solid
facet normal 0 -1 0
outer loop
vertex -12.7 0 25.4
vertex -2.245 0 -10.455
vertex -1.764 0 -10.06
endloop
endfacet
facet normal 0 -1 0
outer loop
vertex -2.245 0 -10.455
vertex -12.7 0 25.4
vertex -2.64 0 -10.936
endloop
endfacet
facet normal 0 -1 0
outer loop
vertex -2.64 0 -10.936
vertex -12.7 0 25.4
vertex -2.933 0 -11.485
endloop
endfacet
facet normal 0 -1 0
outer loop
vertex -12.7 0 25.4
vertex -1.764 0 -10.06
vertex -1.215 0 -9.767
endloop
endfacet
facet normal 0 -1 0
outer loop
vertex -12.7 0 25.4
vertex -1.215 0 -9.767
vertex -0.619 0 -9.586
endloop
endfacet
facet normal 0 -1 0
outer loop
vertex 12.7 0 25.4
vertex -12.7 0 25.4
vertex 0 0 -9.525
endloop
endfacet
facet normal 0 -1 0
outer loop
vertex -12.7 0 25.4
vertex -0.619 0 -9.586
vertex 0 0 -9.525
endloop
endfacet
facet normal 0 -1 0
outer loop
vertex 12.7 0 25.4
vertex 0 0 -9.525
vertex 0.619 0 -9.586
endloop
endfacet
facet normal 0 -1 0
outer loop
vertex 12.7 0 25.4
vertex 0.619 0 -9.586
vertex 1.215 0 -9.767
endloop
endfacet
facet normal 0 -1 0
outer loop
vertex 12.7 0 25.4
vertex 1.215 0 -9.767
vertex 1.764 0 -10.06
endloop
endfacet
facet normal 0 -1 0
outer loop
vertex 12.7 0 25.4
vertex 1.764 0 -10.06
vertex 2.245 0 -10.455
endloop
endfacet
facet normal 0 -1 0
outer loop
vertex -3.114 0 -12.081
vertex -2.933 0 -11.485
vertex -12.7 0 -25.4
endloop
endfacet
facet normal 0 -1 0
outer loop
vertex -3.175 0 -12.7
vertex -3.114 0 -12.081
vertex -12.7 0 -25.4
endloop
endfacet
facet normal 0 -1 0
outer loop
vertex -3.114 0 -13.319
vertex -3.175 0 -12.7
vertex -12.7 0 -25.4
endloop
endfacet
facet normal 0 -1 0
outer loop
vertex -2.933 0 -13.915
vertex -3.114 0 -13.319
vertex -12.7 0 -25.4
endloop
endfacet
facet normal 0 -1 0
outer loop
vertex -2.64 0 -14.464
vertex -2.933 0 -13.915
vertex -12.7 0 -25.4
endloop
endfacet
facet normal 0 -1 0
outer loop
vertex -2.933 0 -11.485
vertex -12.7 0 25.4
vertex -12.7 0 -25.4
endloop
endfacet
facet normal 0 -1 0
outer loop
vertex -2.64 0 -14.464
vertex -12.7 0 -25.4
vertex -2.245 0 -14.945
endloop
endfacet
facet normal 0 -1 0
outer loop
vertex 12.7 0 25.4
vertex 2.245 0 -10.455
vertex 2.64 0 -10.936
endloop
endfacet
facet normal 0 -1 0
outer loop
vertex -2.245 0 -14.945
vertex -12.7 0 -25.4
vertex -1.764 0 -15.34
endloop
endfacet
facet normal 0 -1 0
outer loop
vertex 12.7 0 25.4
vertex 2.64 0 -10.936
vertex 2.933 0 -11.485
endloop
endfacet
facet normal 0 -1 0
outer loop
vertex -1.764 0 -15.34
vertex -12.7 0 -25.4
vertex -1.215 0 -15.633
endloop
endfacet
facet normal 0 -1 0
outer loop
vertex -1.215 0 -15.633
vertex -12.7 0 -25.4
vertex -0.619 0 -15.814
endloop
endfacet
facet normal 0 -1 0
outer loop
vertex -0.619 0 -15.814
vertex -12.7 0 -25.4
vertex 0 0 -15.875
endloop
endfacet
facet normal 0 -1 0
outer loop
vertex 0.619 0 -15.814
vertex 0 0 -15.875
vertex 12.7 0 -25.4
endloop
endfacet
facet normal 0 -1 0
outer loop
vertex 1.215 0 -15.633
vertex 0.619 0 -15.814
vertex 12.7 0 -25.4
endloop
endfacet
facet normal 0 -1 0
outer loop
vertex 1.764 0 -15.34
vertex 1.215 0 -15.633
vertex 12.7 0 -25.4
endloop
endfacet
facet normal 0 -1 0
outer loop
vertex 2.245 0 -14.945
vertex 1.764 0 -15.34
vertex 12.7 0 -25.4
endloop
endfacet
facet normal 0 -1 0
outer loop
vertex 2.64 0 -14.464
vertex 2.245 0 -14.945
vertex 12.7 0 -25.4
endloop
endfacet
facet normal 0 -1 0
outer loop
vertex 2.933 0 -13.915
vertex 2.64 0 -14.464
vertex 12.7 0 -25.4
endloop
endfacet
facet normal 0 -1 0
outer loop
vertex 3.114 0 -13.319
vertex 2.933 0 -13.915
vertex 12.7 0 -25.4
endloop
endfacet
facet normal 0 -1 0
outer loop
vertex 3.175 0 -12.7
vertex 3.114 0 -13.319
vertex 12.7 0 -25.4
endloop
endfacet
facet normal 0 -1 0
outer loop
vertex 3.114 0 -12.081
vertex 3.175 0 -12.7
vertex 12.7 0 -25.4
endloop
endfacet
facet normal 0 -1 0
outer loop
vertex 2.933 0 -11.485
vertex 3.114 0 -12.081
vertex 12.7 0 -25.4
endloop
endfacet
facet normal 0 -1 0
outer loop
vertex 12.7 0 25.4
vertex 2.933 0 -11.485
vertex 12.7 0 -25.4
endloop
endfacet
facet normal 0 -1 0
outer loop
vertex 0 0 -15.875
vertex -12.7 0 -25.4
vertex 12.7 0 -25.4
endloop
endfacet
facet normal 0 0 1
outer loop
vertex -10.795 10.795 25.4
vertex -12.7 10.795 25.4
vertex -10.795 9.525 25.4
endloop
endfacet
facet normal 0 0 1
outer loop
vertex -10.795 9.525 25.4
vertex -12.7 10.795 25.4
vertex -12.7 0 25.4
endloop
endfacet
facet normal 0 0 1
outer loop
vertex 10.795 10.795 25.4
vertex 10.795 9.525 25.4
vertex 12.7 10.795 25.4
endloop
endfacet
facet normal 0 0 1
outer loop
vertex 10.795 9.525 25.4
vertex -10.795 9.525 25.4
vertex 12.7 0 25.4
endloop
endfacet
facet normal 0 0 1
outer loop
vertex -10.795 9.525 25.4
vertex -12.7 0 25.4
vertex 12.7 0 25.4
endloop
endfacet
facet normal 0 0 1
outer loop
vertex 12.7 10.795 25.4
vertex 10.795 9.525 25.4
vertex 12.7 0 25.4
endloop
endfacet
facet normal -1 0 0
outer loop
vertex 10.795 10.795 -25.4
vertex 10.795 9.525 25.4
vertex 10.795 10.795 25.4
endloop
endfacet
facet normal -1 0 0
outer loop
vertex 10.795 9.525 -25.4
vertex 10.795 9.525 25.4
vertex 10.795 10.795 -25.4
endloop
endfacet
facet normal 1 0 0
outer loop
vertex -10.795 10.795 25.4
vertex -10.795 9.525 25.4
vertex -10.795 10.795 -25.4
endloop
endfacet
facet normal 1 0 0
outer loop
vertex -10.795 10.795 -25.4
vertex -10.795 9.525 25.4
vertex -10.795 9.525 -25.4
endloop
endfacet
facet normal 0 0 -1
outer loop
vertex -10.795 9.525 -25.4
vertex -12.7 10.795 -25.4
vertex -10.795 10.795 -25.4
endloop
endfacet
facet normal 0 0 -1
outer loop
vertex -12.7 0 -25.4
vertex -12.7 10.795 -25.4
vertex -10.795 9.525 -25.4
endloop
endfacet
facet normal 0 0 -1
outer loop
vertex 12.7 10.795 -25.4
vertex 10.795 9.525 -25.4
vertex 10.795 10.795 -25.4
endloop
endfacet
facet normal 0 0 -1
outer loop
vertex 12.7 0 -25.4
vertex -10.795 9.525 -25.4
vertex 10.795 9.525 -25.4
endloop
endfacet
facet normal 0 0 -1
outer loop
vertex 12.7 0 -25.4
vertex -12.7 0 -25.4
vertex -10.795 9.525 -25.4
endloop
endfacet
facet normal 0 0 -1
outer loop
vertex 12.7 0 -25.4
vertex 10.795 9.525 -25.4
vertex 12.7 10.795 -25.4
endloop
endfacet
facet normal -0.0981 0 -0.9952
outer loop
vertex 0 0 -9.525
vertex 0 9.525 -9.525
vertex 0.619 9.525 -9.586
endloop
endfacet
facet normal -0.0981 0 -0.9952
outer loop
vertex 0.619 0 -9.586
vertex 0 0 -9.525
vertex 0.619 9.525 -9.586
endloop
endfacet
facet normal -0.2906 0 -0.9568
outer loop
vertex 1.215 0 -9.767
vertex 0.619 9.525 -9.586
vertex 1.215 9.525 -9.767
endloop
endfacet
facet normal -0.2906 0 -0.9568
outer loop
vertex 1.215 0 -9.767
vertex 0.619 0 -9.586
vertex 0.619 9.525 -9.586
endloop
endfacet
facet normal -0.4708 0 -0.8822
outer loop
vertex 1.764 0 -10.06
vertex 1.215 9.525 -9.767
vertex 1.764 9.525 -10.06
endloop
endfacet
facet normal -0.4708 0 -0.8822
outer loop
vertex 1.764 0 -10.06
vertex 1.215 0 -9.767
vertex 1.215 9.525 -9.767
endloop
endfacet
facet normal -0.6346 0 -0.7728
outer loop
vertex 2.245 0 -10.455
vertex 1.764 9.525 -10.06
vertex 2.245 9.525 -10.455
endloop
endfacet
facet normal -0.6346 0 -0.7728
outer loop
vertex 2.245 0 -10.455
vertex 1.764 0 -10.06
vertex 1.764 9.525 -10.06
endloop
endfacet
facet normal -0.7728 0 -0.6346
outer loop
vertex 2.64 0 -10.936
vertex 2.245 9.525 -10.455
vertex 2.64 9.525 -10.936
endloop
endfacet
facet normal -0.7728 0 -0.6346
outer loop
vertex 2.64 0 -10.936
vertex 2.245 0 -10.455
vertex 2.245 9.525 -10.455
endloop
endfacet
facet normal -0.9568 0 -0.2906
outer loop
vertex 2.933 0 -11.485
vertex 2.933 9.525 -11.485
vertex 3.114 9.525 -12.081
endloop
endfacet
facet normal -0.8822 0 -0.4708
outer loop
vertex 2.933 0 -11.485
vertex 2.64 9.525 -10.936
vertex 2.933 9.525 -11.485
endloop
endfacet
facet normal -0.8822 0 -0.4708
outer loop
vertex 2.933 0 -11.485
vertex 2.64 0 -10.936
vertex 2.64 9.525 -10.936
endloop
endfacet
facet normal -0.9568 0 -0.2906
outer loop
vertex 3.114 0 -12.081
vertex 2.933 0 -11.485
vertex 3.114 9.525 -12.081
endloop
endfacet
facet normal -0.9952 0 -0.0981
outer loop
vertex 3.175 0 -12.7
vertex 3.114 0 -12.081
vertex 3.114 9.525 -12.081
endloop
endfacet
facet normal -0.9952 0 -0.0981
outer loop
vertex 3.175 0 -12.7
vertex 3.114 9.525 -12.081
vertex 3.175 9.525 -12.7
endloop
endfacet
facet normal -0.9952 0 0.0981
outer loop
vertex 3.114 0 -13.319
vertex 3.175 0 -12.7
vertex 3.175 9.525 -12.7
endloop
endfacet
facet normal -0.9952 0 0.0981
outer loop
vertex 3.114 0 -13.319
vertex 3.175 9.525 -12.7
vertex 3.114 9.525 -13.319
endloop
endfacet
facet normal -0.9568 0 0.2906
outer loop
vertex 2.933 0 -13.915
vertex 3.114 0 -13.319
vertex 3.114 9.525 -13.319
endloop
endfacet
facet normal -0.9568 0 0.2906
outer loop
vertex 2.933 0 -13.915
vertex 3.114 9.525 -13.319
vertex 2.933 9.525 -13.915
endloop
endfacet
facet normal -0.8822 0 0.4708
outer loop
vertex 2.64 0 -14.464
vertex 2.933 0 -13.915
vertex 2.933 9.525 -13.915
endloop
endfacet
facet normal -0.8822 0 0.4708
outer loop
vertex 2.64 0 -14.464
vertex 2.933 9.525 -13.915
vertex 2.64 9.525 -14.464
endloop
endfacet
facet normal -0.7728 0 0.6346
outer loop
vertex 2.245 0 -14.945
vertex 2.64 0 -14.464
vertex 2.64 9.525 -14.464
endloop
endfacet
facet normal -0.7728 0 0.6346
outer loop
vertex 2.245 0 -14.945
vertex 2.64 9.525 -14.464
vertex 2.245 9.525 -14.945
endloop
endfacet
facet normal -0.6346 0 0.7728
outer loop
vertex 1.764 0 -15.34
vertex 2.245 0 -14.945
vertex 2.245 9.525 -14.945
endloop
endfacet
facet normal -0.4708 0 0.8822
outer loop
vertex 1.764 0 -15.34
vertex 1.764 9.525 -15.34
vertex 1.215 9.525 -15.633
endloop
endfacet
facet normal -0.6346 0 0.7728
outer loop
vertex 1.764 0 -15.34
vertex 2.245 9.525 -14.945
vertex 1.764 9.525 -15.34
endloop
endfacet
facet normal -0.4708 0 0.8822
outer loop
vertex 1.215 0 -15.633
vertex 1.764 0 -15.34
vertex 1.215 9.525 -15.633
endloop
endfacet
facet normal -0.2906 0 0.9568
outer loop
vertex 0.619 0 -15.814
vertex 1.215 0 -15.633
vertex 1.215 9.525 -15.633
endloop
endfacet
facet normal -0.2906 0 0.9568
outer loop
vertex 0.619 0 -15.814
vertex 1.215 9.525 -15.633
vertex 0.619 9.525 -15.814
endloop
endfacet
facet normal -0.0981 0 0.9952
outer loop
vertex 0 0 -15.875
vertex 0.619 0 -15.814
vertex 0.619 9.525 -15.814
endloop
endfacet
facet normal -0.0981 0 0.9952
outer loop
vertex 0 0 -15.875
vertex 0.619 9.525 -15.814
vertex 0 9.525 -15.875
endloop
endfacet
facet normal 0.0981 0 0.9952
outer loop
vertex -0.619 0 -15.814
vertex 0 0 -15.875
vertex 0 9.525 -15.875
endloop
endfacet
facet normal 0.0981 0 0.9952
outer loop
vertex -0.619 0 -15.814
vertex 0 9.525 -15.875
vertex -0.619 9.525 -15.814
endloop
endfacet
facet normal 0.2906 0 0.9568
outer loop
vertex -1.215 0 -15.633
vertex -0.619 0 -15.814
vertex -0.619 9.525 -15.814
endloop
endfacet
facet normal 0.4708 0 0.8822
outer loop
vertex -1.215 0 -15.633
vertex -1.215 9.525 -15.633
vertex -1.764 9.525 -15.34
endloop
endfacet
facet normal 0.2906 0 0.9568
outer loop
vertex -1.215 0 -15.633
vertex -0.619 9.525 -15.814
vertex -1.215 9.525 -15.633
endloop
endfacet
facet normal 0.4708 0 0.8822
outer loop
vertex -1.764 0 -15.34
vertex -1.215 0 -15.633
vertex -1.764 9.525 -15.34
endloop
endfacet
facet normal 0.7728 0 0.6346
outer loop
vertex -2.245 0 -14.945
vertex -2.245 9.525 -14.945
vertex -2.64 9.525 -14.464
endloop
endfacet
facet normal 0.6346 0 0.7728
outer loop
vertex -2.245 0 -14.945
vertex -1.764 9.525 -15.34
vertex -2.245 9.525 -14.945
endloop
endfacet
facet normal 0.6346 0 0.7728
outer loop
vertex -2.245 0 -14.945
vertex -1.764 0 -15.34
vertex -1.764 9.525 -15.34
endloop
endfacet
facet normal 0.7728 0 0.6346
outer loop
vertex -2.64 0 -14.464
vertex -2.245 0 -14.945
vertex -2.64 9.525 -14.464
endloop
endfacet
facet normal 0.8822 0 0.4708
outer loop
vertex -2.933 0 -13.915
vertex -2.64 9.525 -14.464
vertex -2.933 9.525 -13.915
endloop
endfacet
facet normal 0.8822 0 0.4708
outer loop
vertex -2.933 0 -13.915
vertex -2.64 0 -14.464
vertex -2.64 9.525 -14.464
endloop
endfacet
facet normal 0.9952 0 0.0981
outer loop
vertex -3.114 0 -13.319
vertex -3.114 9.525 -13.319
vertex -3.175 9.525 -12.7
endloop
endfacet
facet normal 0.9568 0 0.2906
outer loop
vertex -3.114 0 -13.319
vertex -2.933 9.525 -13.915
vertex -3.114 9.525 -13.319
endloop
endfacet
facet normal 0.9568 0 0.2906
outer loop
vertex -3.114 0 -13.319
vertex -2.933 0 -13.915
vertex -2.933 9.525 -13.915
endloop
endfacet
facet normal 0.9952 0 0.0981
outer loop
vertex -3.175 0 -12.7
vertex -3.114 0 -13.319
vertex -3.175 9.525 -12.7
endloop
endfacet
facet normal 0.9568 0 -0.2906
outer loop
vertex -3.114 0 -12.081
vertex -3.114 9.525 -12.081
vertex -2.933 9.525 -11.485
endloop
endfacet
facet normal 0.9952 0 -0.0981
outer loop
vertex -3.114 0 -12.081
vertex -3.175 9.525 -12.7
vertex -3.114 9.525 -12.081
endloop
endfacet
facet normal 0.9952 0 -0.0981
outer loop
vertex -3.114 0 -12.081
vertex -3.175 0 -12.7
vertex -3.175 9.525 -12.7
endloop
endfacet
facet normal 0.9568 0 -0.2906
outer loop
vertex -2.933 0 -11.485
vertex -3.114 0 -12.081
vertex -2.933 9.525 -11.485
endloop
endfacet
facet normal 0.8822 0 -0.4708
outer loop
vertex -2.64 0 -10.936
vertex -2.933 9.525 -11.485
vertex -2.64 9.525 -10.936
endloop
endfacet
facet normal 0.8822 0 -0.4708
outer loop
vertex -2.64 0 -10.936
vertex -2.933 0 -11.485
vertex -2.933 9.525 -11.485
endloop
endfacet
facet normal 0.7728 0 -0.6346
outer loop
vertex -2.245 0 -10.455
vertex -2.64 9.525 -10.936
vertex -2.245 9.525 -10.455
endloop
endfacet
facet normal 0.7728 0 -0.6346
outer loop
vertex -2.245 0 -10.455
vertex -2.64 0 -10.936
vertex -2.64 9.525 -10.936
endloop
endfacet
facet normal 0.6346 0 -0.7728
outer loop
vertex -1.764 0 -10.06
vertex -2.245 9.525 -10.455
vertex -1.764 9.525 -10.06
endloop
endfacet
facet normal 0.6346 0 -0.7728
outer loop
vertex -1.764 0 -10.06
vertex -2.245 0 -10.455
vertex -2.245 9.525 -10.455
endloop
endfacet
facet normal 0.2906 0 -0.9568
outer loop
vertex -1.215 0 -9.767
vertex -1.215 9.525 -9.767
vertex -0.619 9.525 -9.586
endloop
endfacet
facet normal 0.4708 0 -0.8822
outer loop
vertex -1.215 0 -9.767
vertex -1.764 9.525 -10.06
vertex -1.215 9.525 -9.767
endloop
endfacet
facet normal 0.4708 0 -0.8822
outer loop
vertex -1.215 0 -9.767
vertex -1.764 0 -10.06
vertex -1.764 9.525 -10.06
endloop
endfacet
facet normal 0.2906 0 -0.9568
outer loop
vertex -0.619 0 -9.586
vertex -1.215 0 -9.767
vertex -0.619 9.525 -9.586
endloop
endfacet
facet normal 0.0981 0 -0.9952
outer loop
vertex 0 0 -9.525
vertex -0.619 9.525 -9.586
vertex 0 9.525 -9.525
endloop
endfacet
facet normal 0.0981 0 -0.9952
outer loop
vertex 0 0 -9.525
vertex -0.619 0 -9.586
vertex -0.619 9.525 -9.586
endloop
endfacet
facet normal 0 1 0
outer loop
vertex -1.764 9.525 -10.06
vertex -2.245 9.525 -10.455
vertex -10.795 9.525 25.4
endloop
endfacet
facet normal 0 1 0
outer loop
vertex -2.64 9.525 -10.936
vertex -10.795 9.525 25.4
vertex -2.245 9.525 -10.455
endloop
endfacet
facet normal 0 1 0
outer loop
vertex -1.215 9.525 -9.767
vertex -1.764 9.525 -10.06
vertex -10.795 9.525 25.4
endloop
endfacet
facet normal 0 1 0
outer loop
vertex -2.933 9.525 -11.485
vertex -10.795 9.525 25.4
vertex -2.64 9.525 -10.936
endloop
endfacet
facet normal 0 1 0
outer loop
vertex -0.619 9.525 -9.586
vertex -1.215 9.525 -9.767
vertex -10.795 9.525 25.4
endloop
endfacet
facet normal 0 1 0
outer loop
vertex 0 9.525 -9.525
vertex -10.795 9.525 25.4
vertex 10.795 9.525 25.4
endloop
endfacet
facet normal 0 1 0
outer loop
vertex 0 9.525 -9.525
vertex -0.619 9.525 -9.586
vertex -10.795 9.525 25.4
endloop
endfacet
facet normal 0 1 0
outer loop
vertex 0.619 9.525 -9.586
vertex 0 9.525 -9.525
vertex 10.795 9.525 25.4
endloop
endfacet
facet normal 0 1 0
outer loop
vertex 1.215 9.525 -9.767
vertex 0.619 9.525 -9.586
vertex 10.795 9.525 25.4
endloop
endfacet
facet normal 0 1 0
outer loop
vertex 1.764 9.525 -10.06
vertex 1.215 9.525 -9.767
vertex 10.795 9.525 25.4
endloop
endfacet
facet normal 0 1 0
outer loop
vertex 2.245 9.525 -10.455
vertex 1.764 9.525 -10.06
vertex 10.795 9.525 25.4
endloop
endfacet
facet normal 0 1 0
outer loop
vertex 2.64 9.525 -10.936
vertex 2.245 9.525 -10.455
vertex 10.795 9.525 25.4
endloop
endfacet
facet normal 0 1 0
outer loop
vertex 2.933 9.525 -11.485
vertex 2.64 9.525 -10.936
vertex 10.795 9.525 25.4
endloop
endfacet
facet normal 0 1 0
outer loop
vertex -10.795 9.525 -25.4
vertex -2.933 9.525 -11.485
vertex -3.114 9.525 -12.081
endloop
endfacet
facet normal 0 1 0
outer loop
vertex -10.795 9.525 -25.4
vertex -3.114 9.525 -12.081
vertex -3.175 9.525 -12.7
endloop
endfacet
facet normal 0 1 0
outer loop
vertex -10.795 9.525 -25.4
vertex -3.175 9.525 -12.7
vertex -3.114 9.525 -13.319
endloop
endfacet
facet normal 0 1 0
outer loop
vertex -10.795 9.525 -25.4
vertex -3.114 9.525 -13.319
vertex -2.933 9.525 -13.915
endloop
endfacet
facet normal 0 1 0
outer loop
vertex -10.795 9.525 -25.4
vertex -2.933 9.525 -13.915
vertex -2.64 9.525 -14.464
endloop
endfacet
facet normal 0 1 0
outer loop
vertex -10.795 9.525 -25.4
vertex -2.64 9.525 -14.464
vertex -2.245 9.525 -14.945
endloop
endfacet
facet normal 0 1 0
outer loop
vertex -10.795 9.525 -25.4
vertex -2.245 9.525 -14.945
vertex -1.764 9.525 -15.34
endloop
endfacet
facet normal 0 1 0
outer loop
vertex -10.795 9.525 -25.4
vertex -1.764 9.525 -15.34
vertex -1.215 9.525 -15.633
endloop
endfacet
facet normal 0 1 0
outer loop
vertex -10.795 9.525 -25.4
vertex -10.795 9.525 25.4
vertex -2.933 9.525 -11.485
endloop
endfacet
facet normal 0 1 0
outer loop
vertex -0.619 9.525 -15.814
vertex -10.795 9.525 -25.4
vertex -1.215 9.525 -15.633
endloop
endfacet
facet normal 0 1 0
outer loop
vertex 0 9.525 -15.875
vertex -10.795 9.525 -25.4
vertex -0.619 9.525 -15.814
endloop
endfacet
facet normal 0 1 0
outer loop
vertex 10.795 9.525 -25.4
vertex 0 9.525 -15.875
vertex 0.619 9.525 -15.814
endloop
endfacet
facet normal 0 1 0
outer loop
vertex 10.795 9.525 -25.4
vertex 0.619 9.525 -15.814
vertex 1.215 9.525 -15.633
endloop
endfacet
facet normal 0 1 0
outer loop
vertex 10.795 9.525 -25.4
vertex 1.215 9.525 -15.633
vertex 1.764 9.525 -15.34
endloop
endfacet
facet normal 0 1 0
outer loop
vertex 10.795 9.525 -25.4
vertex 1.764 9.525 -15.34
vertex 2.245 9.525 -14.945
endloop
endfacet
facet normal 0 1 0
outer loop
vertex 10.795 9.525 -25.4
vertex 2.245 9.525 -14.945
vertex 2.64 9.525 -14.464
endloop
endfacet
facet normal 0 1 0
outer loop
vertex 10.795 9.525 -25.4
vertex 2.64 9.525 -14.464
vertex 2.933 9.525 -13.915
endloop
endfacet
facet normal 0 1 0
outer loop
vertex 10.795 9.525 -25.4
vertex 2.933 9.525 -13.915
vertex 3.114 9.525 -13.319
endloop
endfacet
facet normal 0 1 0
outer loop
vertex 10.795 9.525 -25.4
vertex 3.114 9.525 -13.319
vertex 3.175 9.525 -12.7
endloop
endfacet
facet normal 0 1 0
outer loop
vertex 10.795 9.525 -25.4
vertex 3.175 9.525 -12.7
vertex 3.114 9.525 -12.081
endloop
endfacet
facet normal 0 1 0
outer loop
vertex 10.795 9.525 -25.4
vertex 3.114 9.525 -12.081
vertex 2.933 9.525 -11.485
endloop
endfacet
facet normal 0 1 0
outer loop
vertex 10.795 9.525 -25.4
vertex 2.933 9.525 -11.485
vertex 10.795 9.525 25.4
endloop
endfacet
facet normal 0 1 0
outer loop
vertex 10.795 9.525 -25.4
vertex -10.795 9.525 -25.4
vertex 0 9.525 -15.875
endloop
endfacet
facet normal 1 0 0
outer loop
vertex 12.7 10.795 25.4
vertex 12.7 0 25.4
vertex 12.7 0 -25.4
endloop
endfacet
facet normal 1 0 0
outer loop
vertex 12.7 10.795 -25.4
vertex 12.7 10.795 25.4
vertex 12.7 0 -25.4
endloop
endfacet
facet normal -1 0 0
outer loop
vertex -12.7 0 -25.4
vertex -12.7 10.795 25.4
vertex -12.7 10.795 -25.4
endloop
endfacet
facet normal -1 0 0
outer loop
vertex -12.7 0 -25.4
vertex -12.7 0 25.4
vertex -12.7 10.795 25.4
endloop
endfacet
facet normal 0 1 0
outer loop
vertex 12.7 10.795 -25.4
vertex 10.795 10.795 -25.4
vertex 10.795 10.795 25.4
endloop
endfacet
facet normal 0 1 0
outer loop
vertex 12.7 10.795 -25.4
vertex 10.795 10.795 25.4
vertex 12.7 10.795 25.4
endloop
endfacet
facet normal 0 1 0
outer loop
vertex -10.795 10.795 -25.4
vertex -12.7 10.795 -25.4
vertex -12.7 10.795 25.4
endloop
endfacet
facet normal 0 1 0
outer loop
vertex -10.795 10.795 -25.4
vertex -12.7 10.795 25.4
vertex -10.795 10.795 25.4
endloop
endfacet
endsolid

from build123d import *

# Parameters (mm, degrees)
SKETCH1_W               = 25.4
SKETCH1_H               = 50.8
BOSS_EXTRUDE1_DEPTH     = 9.525
SKETCH2_W               = 1.905
SKETCH2_H               = 50.8
BOSS_EXTRUDE2_DEPTH     = 1.27
CUT_EXTRUDE1_DEPTH      = 30.952890094
CUT_EXTRUDE1_DEPTH_BACK = 30.952890094
SKETCH3_R               = 3.175


with BuildPart() as part:
    # Sketch1 → Boss-Extrude1 (new body)
    with BuildSketch(Plane(origin=(0, 0, 0), x_dir=(1, 0, 0), z_dir=(0, 1, 0))):
        Rectangle(SKETCH1_W, SKETCH1_H)
    extrude(amount=BOSS_EXTRUDE1_DEPTH)

    # Sketch2 → Boss-Extrude2 (add)
    with BuildSketch(Plane(origin=(0, 9.525, 0), x_dir=(1, 0, 0), z_dir=(0, 1, 0))):
        with Locations((-11.7475, 0)):
            Rectangle(SKETCH2_W, SKETCH2_H)
        with Locations((11.7475, 0)):
            Rectangle(SKETCH2_W, SKETCH2_H)
    extrude(amount=BOSS_EXTRUDE2_DEPTH)

    # Sketch3 → Cut-Extrude1 (cut, two sides: drawn at the far end of the back side and taken through both)
    with BuildSketch(Plane(origin=(0, 9.525, 0), x_dir=(1, 0, 0), z_dir=(0, 1, 0)).offset(-CUT_EXTRUDE1_DEPTH_BACK)):
        with Locations(Location((0, 12.7, 0), (0, 0, 270))):
            Circle(SKETCH3_R)
    extrude(amount=CUT_EXTRUDE1_DEPTH + CUT_EXTRUDE1_DEPTH_BACK, mode=Mode.SUBTRACT)


solid = part.part
